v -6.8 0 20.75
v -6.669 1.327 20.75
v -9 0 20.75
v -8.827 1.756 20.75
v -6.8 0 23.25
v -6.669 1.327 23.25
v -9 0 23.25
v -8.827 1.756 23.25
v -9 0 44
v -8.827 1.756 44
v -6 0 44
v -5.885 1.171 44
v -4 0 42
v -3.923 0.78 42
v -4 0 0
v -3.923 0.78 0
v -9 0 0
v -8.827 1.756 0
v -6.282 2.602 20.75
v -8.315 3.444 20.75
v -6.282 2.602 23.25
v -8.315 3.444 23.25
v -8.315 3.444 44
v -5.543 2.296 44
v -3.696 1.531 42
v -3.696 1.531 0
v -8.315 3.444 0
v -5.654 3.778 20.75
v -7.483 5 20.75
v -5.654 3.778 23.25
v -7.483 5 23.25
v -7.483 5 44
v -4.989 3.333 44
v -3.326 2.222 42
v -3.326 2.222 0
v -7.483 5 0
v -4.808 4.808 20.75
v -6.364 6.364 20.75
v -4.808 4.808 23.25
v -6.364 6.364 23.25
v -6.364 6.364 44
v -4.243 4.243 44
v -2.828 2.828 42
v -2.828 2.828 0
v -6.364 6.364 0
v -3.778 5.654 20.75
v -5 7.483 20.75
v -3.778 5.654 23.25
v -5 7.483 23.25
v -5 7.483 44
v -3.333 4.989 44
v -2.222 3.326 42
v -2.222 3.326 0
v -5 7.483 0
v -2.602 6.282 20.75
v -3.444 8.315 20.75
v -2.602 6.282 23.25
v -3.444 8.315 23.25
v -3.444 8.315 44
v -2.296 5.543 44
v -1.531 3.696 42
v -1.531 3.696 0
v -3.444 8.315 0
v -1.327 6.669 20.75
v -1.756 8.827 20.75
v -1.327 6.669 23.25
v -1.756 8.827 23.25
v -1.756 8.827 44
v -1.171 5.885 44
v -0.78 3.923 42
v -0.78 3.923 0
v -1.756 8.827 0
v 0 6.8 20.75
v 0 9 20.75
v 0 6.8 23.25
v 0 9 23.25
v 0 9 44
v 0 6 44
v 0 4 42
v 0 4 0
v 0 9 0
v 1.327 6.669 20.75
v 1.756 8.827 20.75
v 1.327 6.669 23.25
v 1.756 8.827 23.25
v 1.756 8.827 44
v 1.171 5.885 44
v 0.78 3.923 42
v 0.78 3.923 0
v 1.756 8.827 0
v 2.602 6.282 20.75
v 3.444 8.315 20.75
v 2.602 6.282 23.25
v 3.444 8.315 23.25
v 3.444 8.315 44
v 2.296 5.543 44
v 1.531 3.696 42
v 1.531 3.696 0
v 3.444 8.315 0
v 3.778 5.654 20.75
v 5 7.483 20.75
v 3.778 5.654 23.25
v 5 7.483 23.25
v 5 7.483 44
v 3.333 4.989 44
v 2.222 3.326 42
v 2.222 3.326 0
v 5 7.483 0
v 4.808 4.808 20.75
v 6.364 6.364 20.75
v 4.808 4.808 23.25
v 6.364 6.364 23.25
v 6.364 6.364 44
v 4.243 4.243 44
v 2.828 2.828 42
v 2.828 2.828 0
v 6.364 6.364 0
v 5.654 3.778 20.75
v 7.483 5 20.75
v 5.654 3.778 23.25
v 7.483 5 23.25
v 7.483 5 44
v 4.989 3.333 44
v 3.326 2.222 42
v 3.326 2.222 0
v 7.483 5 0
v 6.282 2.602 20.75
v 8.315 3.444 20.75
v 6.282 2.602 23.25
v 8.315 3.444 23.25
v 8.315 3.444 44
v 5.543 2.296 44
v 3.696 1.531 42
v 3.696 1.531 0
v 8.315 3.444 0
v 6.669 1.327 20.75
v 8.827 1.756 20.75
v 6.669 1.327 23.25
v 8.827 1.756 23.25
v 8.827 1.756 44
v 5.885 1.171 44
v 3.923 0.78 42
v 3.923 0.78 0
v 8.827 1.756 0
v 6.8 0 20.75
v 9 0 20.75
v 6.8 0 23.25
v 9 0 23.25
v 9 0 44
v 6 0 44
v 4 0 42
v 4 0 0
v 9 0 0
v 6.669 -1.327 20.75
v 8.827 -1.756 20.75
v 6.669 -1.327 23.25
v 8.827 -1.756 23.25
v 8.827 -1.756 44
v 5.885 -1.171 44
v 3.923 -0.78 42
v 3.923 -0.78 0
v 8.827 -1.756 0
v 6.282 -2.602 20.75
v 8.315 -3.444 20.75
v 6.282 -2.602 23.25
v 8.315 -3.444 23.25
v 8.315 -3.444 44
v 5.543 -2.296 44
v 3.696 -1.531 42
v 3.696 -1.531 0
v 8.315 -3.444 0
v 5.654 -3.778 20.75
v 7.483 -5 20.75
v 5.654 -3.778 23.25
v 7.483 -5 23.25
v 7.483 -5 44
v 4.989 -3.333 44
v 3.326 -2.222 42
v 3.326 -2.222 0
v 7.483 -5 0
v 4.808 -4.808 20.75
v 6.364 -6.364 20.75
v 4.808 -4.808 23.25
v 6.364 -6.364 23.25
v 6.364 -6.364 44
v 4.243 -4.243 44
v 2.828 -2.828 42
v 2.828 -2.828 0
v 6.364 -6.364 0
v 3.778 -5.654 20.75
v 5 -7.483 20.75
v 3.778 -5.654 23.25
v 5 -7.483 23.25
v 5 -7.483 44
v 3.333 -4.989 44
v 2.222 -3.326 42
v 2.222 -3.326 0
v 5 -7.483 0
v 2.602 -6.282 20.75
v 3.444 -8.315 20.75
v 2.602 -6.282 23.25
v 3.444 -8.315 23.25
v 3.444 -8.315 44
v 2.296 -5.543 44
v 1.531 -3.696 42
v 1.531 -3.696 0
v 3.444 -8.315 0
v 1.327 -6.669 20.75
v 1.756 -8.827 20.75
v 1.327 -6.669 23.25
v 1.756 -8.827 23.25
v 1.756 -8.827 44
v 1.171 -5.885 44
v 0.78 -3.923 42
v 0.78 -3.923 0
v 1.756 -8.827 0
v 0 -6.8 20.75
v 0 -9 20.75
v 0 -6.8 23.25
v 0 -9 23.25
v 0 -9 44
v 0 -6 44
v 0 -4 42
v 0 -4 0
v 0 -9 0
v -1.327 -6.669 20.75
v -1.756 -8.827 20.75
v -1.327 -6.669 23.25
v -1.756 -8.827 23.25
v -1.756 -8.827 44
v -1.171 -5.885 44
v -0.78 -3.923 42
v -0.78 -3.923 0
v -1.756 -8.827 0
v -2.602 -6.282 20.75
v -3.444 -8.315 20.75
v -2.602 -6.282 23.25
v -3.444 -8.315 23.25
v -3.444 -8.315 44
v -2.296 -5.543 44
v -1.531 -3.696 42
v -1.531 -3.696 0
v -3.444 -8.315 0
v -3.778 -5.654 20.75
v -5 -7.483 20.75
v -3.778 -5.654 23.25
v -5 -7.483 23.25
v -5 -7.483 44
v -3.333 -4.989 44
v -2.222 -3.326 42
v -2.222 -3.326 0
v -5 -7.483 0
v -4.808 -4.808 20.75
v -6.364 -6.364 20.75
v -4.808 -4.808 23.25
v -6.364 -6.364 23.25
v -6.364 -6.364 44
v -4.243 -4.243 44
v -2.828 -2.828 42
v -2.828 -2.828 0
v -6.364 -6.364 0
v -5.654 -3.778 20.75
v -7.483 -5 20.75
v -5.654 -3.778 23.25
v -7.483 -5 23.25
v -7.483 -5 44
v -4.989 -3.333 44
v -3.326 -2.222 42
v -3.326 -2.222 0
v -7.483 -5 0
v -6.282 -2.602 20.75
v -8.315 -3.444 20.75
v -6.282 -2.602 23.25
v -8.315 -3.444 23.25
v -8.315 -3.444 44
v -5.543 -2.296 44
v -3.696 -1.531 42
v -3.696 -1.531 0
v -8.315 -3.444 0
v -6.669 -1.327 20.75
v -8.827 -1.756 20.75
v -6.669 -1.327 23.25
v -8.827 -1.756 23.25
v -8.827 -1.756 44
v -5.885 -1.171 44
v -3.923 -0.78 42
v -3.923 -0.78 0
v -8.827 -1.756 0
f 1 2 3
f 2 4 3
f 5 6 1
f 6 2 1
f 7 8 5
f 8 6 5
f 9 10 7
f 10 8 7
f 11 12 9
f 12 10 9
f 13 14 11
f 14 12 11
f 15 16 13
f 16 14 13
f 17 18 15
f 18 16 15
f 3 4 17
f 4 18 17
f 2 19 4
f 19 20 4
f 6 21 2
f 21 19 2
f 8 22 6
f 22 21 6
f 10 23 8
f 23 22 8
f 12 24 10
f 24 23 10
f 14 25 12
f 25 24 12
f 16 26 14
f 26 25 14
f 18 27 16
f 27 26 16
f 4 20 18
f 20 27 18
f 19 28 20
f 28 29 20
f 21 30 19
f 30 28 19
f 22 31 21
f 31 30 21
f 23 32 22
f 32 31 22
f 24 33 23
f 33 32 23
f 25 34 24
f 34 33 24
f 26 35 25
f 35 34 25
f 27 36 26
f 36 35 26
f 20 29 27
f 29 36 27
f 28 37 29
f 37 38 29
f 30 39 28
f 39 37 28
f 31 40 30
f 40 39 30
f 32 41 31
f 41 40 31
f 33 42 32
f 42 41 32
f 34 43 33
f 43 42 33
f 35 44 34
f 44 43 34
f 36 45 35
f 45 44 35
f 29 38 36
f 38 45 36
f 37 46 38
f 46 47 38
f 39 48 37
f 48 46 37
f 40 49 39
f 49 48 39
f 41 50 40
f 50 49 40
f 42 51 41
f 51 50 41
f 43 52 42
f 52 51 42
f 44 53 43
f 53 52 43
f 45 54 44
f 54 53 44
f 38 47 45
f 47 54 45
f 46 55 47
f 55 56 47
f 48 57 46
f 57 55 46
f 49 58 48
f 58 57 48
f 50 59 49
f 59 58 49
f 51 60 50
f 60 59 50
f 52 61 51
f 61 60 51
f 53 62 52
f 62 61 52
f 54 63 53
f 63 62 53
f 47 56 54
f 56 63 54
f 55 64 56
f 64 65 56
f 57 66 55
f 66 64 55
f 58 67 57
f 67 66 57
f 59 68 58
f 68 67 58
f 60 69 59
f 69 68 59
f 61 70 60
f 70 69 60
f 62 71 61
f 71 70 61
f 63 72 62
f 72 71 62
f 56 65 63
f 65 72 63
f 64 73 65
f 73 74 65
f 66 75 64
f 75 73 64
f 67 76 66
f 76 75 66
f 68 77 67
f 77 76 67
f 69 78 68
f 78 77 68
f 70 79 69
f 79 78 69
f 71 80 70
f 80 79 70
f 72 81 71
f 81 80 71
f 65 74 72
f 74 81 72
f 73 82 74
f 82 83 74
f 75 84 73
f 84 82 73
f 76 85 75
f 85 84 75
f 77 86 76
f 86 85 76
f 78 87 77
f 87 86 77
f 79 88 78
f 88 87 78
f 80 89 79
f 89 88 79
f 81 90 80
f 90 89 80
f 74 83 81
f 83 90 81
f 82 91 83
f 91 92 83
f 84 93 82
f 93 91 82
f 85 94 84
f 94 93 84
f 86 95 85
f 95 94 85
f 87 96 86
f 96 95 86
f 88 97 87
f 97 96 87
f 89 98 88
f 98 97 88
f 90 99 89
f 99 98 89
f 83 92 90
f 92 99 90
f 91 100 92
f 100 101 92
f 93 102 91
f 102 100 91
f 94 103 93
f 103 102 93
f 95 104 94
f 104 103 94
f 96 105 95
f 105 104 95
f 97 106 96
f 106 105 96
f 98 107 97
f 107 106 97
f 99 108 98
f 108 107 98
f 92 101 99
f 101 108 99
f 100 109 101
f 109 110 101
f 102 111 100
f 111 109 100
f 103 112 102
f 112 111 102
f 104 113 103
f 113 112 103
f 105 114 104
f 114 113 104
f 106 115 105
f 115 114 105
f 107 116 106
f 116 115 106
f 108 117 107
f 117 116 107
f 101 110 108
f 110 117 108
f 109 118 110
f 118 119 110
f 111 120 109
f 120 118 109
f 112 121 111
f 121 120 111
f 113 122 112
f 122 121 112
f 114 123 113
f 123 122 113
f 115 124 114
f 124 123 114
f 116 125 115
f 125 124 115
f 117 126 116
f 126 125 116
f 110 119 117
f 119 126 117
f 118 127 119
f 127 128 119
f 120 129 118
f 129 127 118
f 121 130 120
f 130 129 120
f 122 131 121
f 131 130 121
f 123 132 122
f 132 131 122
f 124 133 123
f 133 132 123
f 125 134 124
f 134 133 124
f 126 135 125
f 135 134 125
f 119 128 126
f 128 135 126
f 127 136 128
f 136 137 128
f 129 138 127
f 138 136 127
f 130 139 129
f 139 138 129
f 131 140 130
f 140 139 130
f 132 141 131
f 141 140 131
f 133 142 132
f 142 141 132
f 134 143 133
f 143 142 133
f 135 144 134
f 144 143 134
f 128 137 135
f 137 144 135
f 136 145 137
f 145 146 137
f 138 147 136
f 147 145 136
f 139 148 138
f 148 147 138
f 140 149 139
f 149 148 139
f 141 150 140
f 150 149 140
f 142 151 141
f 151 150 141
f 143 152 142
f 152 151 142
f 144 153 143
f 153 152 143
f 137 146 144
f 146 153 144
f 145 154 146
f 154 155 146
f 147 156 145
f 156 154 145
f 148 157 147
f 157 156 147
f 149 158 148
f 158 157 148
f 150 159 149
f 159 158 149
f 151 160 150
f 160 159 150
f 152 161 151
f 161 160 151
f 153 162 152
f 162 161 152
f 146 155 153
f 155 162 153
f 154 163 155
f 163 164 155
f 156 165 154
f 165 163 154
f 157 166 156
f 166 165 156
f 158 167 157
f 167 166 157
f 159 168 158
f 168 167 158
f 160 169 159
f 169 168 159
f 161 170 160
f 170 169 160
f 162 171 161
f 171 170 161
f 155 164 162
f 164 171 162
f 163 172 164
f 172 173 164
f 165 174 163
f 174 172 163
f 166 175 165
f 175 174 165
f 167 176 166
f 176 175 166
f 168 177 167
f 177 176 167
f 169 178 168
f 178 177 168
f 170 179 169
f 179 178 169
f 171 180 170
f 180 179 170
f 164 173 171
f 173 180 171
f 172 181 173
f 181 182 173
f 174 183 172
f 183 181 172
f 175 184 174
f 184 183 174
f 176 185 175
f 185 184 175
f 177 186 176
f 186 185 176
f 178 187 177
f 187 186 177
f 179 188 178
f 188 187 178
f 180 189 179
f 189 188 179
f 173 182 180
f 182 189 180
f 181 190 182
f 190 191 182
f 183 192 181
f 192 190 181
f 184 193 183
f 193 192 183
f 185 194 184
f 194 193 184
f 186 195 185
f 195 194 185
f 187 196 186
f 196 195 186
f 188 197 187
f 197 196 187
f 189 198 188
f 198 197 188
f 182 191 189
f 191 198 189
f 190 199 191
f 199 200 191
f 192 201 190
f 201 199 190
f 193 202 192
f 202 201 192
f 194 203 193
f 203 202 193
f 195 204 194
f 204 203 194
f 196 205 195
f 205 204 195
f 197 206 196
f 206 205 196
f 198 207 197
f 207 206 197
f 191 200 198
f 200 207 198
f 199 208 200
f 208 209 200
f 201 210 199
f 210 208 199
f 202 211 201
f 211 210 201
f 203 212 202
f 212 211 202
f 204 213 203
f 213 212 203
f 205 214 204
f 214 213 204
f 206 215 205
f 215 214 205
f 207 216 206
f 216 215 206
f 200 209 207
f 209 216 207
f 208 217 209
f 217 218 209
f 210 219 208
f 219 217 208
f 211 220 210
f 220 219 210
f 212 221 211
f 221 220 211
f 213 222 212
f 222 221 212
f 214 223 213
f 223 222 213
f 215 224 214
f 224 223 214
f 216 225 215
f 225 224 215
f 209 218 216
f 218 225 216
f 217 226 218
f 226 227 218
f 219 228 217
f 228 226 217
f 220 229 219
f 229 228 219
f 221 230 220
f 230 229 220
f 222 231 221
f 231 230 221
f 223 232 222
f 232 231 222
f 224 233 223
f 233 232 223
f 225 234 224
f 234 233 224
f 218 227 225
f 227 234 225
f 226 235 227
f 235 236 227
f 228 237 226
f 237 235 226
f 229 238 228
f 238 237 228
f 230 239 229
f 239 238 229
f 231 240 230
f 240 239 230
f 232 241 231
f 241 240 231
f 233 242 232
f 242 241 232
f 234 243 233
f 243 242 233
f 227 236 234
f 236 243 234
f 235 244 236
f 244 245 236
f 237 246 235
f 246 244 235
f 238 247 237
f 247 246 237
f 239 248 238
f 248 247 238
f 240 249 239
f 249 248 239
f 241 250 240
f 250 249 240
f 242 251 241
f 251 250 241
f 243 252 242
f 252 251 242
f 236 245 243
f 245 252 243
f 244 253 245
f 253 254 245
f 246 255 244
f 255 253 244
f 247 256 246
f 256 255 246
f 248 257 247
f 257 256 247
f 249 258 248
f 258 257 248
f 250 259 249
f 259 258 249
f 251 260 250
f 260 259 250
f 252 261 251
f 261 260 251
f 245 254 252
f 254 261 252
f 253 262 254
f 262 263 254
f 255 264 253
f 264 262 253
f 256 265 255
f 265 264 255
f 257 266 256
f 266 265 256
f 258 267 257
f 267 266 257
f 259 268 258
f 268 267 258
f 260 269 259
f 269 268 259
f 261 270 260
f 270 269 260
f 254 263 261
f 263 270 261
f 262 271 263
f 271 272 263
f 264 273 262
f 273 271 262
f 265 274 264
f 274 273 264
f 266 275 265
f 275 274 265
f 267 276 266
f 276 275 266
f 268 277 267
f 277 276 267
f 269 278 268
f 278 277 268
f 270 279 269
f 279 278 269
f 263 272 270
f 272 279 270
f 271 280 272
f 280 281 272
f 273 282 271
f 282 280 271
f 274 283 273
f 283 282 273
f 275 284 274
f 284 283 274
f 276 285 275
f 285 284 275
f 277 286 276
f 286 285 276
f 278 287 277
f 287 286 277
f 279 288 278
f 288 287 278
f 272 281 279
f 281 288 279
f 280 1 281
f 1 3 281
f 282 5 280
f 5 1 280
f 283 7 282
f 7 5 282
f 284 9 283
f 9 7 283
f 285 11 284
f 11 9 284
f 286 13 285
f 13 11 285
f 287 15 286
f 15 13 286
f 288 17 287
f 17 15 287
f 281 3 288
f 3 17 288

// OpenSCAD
$fn = 32;

// ----------------------------------------------------------------------
// Grooved revolve: thread_relief, bore R4
// ----------------------------------------------------------------------

// --- parameters (mm) ---
bore_r = 4;               // bore radius
outer_r = 9;              // outer radius of the body
total_h = 44;             // overall height, Z
wall = 5;                 // radial wall thickness
groove_w = 2.5;           // groove width
groove_d = 2.2;           // groove depth
grooves = 1;              // number of outer grooves
relief = 2;               // thread relief leg at the bore mouth
relief_angle = 45;        // thread relief chamfer angle, degrees

bbox_x = 2 * outer_r;  // full diameter
bore_d = 2 * bore_r;  // bore diameter
body_d = 2 * outer_r;  // body diameter
revolve_angle = 360;  // full turn around the Z axis

profile = [[4, 0], [9, 0], [9, 20.75], [6.8, 20.75], [6.8, 23.25], [9, 23.25], [9, 44], [6, 44], [4, 42]];  // primary outline, 9 points, counter clockwise

// --- the one profile operation ---
rotate_extrude(angle = revolve_angle) polygon(points = profile);
